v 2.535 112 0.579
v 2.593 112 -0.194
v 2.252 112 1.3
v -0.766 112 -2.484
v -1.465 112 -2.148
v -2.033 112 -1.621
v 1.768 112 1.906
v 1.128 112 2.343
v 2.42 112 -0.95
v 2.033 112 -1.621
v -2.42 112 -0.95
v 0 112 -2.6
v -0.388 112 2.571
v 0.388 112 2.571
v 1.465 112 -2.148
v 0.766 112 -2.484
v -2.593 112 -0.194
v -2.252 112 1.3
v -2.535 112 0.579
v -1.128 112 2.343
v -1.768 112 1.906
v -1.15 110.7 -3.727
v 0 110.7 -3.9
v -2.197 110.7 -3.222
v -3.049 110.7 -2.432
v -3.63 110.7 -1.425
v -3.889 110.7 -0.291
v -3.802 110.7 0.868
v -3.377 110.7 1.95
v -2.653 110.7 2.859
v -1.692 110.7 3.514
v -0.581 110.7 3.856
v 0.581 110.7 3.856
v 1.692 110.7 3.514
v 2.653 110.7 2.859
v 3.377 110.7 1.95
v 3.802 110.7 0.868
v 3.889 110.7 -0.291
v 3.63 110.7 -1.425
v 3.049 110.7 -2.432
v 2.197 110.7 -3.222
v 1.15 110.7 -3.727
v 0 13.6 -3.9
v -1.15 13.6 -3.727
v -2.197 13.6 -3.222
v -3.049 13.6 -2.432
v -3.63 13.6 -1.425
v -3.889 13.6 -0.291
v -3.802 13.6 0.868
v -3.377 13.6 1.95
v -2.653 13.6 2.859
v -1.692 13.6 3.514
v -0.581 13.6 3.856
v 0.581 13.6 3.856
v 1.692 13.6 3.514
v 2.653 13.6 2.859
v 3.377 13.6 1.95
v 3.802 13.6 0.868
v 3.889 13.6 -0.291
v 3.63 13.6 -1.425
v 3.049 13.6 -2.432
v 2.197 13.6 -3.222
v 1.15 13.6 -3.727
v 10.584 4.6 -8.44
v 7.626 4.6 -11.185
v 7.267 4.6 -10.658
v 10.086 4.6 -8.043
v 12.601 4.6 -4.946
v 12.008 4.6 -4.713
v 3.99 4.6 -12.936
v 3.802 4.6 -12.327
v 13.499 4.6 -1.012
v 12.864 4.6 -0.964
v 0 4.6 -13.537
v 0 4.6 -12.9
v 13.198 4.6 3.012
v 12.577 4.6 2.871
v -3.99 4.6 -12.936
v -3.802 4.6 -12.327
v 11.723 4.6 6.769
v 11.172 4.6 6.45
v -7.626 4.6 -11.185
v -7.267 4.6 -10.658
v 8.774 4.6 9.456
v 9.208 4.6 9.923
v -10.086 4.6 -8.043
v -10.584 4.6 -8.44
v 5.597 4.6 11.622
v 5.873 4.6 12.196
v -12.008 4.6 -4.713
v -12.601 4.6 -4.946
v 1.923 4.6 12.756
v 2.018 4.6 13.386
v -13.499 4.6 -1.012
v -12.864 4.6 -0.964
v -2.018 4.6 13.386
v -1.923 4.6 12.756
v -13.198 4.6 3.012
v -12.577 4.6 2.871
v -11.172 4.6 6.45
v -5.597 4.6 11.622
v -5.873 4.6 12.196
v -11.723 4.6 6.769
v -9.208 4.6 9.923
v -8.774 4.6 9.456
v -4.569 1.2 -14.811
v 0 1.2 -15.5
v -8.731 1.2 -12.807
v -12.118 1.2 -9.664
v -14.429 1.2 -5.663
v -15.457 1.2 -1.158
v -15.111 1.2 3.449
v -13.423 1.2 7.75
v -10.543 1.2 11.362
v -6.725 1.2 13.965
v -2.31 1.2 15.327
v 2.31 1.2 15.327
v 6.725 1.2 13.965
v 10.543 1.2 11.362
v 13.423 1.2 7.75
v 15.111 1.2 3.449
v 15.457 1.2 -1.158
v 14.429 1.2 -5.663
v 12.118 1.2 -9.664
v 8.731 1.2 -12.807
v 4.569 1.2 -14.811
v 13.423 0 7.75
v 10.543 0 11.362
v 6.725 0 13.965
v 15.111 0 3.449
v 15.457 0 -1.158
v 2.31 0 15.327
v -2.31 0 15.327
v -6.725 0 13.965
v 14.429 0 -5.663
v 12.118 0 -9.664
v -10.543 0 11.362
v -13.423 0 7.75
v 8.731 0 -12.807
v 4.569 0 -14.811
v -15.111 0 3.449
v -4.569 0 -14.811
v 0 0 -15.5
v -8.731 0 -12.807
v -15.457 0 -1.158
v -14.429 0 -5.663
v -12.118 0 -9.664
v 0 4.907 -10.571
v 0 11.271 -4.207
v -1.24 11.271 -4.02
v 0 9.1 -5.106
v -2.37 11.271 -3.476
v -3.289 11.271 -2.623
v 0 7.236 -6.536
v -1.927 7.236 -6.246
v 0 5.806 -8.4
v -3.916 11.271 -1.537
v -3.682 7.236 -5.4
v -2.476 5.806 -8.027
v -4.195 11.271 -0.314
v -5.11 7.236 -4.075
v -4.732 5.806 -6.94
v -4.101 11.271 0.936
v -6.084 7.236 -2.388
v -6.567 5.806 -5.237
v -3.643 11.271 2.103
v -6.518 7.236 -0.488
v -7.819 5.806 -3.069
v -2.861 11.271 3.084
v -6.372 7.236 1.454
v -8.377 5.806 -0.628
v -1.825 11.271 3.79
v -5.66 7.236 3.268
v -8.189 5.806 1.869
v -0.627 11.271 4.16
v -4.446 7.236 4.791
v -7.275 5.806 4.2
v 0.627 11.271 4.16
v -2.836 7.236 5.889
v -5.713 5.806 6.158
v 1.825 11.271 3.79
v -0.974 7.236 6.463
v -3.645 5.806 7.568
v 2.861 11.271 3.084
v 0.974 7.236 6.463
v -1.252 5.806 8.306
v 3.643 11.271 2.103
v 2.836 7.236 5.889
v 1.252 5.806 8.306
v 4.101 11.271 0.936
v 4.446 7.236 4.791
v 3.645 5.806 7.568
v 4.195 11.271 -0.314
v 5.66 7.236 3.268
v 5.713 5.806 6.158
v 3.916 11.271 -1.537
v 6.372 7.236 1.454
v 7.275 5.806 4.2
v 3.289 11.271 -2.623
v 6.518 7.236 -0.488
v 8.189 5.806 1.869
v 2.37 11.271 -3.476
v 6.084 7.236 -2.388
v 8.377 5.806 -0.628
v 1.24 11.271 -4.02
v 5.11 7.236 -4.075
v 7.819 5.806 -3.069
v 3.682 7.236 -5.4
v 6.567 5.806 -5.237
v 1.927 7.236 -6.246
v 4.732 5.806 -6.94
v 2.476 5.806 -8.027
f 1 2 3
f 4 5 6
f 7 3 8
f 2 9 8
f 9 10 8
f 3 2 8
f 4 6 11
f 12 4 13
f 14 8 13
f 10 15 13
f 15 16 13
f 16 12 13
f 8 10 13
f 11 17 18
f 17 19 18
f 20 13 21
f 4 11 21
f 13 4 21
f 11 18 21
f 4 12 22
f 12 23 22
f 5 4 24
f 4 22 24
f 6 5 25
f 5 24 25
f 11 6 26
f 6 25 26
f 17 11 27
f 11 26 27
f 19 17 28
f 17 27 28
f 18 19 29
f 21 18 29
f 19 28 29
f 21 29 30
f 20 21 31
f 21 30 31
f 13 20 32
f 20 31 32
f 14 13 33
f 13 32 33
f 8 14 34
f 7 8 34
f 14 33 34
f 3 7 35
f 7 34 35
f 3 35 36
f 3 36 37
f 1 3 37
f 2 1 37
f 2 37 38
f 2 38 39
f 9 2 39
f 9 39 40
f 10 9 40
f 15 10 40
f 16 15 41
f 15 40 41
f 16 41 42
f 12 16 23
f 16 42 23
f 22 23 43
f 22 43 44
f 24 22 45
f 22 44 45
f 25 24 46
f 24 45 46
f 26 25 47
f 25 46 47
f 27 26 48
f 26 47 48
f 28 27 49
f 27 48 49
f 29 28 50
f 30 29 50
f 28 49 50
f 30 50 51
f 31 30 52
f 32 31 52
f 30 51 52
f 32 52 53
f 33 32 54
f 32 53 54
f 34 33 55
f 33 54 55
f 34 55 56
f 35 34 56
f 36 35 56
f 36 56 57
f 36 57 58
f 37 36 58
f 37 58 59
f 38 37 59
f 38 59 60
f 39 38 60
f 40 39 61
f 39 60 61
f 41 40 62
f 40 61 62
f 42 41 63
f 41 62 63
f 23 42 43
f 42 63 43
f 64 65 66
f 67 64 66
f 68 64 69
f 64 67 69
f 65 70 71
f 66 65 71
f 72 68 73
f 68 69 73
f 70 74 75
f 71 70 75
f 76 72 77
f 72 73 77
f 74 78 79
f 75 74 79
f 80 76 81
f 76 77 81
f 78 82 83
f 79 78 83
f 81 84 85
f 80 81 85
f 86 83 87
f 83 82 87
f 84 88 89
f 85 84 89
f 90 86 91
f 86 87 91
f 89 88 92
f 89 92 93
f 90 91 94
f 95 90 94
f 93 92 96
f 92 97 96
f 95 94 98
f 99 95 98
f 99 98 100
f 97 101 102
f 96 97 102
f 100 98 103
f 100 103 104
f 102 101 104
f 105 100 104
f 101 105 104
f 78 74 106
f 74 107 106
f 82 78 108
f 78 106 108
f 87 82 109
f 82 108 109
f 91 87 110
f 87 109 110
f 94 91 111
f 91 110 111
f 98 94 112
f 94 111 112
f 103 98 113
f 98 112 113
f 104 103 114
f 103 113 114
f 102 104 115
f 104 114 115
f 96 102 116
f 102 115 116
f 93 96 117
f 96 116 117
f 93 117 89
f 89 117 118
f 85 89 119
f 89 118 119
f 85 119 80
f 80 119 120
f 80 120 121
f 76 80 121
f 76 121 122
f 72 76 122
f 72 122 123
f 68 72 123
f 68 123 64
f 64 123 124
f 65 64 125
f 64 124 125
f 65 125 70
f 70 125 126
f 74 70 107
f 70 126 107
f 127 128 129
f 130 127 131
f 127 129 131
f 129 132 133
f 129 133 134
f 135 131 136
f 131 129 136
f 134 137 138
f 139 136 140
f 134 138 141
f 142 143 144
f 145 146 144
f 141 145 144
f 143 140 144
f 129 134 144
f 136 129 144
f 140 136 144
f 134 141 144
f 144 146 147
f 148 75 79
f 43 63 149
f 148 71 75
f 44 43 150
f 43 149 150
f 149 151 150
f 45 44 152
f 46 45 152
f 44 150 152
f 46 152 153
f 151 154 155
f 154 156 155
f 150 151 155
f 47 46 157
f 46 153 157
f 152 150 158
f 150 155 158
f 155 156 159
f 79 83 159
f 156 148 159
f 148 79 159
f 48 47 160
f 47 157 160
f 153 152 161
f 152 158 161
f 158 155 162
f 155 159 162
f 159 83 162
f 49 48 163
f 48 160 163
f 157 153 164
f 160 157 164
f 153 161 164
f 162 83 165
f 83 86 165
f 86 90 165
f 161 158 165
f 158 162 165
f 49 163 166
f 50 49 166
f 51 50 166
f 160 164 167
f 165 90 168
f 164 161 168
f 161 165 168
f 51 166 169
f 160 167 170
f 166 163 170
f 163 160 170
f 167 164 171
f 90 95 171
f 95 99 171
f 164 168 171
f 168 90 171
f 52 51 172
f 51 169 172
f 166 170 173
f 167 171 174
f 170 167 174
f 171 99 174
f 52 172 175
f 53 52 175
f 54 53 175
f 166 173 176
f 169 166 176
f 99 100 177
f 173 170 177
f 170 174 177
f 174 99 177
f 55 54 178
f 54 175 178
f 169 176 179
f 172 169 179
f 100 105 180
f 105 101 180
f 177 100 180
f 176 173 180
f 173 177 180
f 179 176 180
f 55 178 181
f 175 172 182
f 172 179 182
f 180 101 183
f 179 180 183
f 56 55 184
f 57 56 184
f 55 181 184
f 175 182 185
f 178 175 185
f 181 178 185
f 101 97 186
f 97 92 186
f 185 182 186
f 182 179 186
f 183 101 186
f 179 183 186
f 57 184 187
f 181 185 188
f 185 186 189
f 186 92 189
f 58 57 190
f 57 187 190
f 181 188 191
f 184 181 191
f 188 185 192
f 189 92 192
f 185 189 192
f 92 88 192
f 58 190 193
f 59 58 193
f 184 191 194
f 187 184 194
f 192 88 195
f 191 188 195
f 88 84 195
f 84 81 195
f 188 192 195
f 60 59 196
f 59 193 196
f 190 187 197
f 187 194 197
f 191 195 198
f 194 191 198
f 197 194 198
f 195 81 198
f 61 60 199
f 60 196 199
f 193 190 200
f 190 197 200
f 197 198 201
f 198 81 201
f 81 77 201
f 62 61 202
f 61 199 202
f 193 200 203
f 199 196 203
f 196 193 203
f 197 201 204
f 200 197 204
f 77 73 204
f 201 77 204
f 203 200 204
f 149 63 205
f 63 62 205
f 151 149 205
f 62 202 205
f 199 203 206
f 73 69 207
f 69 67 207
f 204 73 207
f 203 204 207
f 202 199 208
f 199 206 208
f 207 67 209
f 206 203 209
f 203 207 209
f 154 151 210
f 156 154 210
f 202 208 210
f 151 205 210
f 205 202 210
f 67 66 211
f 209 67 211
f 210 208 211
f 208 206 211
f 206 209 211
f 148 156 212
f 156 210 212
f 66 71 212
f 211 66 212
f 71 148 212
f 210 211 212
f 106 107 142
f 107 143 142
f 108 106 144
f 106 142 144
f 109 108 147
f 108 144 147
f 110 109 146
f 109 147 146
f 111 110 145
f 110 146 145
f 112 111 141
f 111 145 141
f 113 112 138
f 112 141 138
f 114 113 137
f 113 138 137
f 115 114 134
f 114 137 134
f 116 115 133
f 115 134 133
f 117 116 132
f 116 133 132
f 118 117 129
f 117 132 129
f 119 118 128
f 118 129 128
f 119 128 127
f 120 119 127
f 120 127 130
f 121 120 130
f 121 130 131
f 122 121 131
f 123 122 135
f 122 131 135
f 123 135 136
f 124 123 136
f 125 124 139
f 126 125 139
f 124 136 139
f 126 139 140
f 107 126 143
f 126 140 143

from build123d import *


with BuildPart() as part:
    # Эскиз1 → Повернуть1 (revolve)
    with BuildSketch(Plane.XY, mode=Mode.PRIVATE) as revolve_1_sk:
        with BuildLine():
            Line((0, 0), (0, 112))
            Line((0, 112), (2.6, 112))
            Line((2.6, 112), (3.9, 110.7))
            Line((3.9, 110.7), (3.9, 13.6))
            ThreePointArc((3.9, 13.6), (6.536038969, 7.236038969), (12.9, 4.6))
            Line((12.9, 4.6), (13.537009085, 4.6))
            Line((13.537009085, 4.6), (15.5, 1.2))
            Line((15.5, 1.2), (15.5, 0))
            Line((15.5, 0), (0, 0))
        make_face()
    revolve(revolve_1_sk.sketch.rotate(Axis((0, 0, 0), (0, 1, 0)), 90), axis=Axis((0, 0, 0), (0, 1, 0)))


solid = part.part
